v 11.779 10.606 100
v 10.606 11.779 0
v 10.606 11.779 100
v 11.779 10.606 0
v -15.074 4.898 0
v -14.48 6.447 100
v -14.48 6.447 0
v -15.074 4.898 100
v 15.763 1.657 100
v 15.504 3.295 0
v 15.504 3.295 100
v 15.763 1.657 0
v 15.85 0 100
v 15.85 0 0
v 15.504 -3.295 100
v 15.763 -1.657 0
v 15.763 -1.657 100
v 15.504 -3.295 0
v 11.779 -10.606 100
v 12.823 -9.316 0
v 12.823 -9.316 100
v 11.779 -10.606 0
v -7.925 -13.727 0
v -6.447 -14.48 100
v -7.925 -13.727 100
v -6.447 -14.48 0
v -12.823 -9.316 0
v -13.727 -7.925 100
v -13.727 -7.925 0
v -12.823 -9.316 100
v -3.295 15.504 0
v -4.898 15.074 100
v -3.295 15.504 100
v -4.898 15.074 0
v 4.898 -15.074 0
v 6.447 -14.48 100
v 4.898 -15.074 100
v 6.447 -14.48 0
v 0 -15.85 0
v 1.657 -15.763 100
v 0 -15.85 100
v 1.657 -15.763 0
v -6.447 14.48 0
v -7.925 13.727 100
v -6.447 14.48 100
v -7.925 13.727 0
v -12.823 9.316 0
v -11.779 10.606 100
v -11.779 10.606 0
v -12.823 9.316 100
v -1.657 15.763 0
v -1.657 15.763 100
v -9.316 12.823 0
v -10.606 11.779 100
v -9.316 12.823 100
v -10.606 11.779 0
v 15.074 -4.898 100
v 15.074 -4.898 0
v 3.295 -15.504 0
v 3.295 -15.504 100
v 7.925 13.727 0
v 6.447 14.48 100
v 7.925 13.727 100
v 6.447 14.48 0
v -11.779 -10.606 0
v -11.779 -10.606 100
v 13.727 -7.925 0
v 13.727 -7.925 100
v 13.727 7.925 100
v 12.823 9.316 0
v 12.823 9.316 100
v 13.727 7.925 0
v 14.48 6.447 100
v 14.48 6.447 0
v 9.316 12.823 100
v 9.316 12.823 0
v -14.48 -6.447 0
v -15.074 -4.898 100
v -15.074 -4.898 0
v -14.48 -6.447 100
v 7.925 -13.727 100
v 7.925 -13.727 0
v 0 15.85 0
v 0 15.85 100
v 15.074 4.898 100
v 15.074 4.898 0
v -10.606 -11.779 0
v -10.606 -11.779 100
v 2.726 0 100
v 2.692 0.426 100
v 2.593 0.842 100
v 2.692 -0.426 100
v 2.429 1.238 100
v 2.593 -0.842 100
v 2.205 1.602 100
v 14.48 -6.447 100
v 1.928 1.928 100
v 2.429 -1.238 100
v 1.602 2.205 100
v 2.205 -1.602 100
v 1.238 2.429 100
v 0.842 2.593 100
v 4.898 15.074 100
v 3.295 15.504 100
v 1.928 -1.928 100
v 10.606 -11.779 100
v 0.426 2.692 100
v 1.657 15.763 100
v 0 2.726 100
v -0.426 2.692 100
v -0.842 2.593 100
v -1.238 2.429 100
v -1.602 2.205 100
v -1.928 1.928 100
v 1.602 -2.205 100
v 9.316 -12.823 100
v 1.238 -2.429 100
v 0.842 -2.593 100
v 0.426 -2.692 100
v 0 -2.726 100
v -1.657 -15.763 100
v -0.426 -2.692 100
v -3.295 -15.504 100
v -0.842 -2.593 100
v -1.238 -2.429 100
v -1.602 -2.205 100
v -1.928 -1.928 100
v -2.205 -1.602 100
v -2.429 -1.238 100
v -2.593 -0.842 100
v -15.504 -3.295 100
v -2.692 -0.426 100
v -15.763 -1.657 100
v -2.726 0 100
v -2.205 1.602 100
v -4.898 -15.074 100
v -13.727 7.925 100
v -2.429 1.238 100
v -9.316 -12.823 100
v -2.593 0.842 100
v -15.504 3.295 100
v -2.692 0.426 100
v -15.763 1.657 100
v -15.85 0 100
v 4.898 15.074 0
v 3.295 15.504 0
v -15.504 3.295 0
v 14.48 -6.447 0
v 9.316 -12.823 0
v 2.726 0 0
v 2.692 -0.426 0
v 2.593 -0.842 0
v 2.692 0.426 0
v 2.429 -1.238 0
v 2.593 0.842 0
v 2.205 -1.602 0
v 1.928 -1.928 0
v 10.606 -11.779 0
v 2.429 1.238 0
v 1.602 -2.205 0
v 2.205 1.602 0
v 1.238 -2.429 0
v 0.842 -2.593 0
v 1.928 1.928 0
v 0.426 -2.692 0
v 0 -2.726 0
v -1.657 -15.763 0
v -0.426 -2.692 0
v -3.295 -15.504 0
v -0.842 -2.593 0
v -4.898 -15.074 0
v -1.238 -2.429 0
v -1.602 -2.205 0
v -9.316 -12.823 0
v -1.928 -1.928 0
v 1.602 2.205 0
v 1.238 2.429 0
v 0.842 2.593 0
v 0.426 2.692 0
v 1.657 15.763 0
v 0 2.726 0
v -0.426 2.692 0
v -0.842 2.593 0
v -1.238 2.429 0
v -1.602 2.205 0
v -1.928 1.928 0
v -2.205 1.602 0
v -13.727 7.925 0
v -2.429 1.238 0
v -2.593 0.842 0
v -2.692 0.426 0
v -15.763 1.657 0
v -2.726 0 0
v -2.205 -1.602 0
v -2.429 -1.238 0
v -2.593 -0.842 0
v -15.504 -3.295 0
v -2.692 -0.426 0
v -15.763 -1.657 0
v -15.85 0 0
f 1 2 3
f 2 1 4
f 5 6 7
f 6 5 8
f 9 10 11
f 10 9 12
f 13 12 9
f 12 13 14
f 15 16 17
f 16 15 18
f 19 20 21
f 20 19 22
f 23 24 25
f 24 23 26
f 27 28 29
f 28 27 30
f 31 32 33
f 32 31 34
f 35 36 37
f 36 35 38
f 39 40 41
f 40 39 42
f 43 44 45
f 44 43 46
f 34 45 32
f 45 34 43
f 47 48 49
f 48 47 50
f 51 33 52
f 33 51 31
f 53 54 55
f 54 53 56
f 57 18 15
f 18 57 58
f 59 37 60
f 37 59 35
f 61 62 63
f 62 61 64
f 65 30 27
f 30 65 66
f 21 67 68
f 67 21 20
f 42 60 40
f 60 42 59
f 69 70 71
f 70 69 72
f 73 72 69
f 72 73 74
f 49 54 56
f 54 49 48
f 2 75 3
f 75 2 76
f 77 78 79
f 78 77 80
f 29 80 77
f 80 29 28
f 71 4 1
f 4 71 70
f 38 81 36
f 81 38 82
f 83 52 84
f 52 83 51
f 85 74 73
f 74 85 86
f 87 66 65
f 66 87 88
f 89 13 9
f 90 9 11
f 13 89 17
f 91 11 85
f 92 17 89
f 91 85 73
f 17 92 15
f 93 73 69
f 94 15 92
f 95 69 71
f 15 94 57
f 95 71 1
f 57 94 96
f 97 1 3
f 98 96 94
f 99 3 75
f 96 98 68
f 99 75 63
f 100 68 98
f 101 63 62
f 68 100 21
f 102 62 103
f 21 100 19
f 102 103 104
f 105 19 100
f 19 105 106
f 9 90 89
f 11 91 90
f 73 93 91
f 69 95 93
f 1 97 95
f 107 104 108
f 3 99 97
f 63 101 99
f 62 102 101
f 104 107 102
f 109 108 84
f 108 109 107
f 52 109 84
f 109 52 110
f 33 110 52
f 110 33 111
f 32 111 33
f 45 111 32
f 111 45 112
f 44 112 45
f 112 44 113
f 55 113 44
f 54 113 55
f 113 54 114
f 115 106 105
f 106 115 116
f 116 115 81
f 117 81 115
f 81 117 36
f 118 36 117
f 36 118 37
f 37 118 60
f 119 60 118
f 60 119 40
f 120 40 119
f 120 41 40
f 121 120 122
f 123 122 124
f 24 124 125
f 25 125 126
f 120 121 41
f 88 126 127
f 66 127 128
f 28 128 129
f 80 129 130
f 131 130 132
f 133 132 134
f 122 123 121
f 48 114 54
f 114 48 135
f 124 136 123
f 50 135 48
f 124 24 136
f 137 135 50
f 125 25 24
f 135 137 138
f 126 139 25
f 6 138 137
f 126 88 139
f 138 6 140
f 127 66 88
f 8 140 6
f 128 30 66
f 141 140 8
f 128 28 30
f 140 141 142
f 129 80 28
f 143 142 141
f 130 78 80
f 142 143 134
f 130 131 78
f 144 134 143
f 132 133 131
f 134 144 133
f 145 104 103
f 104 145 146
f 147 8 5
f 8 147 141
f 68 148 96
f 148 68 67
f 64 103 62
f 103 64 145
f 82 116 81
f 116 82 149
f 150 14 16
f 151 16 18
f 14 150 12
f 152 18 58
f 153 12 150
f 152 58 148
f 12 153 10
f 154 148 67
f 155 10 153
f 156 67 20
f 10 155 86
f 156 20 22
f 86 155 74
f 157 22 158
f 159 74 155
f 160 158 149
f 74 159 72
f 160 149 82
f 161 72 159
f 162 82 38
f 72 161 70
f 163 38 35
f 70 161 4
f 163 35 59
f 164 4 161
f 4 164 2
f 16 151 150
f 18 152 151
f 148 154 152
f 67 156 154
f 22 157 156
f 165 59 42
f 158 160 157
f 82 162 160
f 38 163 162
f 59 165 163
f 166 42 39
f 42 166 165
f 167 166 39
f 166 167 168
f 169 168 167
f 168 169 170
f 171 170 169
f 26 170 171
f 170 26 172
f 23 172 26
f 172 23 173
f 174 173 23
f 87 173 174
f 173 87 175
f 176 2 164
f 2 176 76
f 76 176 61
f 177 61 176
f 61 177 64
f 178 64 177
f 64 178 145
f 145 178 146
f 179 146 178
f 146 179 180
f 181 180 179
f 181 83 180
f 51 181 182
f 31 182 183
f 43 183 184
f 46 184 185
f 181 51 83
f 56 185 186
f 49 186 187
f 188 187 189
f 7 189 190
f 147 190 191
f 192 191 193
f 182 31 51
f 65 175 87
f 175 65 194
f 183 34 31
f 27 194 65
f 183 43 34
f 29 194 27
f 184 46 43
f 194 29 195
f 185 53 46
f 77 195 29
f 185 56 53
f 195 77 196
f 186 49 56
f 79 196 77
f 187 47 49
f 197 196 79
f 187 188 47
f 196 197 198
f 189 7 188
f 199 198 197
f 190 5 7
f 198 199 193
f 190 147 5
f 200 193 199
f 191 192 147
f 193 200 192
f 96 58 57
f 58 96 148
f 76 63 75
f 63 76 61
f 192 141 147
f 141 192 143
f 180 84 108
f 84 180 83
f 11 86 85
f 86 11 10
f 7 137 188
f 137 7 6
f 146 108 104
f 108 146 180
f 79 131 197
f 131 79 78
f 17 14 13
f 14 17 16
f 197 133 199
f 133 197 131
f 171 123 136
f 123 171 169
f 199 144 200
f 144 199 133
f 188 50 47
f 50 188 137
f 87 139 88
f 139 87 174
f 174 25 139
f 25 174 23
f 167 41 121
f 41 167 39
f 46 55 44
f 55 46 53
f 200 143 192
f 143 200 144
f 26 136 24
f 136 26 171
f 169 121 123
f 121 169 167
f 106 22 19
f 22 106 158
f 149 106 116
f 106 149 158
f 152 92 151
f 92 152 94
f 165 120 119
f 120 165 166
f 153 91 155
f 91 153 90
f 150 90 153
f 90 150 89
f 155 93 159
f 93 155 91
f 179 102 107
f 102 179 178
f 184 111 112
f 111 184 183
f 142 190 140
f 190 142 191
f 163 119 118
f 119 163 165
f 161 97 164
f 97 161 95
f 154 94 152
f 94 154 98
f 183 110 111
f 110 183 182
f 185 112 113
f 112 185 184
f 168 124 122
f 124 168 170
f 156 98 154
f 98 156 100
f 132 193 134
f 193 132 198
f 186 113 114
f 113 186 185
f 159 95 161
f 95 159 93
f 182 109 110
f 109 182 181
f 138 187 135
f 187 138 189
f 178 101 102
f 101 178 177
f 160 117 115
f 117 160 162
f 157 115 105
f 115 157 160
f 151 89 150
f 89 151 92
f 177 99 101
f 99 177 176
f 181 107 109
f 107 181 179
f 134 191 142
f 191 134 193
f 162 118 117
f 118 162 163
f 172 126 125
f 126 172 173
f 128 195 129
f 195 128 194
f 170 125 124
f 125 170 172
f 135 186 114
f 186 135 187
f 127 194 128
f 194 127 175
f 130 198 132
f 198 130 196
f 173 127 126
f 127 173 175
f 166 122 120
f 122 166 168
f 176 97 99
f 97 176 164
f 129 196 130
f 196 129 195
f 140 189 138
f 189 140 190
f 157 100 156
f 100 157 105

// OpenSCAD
        wall_thickness = 2.73;
        bore_clearance = 0.726;
        roller_radius = 15.85;

        module roller() {
            difference() {
                cylinder(h=100, r=roller_radius, $fn=60);
                translate([0,0,-5])
                    cylinder(h=110, r=bore_clearance + 2, $fn=40);
            }
        }
        roller();
        
